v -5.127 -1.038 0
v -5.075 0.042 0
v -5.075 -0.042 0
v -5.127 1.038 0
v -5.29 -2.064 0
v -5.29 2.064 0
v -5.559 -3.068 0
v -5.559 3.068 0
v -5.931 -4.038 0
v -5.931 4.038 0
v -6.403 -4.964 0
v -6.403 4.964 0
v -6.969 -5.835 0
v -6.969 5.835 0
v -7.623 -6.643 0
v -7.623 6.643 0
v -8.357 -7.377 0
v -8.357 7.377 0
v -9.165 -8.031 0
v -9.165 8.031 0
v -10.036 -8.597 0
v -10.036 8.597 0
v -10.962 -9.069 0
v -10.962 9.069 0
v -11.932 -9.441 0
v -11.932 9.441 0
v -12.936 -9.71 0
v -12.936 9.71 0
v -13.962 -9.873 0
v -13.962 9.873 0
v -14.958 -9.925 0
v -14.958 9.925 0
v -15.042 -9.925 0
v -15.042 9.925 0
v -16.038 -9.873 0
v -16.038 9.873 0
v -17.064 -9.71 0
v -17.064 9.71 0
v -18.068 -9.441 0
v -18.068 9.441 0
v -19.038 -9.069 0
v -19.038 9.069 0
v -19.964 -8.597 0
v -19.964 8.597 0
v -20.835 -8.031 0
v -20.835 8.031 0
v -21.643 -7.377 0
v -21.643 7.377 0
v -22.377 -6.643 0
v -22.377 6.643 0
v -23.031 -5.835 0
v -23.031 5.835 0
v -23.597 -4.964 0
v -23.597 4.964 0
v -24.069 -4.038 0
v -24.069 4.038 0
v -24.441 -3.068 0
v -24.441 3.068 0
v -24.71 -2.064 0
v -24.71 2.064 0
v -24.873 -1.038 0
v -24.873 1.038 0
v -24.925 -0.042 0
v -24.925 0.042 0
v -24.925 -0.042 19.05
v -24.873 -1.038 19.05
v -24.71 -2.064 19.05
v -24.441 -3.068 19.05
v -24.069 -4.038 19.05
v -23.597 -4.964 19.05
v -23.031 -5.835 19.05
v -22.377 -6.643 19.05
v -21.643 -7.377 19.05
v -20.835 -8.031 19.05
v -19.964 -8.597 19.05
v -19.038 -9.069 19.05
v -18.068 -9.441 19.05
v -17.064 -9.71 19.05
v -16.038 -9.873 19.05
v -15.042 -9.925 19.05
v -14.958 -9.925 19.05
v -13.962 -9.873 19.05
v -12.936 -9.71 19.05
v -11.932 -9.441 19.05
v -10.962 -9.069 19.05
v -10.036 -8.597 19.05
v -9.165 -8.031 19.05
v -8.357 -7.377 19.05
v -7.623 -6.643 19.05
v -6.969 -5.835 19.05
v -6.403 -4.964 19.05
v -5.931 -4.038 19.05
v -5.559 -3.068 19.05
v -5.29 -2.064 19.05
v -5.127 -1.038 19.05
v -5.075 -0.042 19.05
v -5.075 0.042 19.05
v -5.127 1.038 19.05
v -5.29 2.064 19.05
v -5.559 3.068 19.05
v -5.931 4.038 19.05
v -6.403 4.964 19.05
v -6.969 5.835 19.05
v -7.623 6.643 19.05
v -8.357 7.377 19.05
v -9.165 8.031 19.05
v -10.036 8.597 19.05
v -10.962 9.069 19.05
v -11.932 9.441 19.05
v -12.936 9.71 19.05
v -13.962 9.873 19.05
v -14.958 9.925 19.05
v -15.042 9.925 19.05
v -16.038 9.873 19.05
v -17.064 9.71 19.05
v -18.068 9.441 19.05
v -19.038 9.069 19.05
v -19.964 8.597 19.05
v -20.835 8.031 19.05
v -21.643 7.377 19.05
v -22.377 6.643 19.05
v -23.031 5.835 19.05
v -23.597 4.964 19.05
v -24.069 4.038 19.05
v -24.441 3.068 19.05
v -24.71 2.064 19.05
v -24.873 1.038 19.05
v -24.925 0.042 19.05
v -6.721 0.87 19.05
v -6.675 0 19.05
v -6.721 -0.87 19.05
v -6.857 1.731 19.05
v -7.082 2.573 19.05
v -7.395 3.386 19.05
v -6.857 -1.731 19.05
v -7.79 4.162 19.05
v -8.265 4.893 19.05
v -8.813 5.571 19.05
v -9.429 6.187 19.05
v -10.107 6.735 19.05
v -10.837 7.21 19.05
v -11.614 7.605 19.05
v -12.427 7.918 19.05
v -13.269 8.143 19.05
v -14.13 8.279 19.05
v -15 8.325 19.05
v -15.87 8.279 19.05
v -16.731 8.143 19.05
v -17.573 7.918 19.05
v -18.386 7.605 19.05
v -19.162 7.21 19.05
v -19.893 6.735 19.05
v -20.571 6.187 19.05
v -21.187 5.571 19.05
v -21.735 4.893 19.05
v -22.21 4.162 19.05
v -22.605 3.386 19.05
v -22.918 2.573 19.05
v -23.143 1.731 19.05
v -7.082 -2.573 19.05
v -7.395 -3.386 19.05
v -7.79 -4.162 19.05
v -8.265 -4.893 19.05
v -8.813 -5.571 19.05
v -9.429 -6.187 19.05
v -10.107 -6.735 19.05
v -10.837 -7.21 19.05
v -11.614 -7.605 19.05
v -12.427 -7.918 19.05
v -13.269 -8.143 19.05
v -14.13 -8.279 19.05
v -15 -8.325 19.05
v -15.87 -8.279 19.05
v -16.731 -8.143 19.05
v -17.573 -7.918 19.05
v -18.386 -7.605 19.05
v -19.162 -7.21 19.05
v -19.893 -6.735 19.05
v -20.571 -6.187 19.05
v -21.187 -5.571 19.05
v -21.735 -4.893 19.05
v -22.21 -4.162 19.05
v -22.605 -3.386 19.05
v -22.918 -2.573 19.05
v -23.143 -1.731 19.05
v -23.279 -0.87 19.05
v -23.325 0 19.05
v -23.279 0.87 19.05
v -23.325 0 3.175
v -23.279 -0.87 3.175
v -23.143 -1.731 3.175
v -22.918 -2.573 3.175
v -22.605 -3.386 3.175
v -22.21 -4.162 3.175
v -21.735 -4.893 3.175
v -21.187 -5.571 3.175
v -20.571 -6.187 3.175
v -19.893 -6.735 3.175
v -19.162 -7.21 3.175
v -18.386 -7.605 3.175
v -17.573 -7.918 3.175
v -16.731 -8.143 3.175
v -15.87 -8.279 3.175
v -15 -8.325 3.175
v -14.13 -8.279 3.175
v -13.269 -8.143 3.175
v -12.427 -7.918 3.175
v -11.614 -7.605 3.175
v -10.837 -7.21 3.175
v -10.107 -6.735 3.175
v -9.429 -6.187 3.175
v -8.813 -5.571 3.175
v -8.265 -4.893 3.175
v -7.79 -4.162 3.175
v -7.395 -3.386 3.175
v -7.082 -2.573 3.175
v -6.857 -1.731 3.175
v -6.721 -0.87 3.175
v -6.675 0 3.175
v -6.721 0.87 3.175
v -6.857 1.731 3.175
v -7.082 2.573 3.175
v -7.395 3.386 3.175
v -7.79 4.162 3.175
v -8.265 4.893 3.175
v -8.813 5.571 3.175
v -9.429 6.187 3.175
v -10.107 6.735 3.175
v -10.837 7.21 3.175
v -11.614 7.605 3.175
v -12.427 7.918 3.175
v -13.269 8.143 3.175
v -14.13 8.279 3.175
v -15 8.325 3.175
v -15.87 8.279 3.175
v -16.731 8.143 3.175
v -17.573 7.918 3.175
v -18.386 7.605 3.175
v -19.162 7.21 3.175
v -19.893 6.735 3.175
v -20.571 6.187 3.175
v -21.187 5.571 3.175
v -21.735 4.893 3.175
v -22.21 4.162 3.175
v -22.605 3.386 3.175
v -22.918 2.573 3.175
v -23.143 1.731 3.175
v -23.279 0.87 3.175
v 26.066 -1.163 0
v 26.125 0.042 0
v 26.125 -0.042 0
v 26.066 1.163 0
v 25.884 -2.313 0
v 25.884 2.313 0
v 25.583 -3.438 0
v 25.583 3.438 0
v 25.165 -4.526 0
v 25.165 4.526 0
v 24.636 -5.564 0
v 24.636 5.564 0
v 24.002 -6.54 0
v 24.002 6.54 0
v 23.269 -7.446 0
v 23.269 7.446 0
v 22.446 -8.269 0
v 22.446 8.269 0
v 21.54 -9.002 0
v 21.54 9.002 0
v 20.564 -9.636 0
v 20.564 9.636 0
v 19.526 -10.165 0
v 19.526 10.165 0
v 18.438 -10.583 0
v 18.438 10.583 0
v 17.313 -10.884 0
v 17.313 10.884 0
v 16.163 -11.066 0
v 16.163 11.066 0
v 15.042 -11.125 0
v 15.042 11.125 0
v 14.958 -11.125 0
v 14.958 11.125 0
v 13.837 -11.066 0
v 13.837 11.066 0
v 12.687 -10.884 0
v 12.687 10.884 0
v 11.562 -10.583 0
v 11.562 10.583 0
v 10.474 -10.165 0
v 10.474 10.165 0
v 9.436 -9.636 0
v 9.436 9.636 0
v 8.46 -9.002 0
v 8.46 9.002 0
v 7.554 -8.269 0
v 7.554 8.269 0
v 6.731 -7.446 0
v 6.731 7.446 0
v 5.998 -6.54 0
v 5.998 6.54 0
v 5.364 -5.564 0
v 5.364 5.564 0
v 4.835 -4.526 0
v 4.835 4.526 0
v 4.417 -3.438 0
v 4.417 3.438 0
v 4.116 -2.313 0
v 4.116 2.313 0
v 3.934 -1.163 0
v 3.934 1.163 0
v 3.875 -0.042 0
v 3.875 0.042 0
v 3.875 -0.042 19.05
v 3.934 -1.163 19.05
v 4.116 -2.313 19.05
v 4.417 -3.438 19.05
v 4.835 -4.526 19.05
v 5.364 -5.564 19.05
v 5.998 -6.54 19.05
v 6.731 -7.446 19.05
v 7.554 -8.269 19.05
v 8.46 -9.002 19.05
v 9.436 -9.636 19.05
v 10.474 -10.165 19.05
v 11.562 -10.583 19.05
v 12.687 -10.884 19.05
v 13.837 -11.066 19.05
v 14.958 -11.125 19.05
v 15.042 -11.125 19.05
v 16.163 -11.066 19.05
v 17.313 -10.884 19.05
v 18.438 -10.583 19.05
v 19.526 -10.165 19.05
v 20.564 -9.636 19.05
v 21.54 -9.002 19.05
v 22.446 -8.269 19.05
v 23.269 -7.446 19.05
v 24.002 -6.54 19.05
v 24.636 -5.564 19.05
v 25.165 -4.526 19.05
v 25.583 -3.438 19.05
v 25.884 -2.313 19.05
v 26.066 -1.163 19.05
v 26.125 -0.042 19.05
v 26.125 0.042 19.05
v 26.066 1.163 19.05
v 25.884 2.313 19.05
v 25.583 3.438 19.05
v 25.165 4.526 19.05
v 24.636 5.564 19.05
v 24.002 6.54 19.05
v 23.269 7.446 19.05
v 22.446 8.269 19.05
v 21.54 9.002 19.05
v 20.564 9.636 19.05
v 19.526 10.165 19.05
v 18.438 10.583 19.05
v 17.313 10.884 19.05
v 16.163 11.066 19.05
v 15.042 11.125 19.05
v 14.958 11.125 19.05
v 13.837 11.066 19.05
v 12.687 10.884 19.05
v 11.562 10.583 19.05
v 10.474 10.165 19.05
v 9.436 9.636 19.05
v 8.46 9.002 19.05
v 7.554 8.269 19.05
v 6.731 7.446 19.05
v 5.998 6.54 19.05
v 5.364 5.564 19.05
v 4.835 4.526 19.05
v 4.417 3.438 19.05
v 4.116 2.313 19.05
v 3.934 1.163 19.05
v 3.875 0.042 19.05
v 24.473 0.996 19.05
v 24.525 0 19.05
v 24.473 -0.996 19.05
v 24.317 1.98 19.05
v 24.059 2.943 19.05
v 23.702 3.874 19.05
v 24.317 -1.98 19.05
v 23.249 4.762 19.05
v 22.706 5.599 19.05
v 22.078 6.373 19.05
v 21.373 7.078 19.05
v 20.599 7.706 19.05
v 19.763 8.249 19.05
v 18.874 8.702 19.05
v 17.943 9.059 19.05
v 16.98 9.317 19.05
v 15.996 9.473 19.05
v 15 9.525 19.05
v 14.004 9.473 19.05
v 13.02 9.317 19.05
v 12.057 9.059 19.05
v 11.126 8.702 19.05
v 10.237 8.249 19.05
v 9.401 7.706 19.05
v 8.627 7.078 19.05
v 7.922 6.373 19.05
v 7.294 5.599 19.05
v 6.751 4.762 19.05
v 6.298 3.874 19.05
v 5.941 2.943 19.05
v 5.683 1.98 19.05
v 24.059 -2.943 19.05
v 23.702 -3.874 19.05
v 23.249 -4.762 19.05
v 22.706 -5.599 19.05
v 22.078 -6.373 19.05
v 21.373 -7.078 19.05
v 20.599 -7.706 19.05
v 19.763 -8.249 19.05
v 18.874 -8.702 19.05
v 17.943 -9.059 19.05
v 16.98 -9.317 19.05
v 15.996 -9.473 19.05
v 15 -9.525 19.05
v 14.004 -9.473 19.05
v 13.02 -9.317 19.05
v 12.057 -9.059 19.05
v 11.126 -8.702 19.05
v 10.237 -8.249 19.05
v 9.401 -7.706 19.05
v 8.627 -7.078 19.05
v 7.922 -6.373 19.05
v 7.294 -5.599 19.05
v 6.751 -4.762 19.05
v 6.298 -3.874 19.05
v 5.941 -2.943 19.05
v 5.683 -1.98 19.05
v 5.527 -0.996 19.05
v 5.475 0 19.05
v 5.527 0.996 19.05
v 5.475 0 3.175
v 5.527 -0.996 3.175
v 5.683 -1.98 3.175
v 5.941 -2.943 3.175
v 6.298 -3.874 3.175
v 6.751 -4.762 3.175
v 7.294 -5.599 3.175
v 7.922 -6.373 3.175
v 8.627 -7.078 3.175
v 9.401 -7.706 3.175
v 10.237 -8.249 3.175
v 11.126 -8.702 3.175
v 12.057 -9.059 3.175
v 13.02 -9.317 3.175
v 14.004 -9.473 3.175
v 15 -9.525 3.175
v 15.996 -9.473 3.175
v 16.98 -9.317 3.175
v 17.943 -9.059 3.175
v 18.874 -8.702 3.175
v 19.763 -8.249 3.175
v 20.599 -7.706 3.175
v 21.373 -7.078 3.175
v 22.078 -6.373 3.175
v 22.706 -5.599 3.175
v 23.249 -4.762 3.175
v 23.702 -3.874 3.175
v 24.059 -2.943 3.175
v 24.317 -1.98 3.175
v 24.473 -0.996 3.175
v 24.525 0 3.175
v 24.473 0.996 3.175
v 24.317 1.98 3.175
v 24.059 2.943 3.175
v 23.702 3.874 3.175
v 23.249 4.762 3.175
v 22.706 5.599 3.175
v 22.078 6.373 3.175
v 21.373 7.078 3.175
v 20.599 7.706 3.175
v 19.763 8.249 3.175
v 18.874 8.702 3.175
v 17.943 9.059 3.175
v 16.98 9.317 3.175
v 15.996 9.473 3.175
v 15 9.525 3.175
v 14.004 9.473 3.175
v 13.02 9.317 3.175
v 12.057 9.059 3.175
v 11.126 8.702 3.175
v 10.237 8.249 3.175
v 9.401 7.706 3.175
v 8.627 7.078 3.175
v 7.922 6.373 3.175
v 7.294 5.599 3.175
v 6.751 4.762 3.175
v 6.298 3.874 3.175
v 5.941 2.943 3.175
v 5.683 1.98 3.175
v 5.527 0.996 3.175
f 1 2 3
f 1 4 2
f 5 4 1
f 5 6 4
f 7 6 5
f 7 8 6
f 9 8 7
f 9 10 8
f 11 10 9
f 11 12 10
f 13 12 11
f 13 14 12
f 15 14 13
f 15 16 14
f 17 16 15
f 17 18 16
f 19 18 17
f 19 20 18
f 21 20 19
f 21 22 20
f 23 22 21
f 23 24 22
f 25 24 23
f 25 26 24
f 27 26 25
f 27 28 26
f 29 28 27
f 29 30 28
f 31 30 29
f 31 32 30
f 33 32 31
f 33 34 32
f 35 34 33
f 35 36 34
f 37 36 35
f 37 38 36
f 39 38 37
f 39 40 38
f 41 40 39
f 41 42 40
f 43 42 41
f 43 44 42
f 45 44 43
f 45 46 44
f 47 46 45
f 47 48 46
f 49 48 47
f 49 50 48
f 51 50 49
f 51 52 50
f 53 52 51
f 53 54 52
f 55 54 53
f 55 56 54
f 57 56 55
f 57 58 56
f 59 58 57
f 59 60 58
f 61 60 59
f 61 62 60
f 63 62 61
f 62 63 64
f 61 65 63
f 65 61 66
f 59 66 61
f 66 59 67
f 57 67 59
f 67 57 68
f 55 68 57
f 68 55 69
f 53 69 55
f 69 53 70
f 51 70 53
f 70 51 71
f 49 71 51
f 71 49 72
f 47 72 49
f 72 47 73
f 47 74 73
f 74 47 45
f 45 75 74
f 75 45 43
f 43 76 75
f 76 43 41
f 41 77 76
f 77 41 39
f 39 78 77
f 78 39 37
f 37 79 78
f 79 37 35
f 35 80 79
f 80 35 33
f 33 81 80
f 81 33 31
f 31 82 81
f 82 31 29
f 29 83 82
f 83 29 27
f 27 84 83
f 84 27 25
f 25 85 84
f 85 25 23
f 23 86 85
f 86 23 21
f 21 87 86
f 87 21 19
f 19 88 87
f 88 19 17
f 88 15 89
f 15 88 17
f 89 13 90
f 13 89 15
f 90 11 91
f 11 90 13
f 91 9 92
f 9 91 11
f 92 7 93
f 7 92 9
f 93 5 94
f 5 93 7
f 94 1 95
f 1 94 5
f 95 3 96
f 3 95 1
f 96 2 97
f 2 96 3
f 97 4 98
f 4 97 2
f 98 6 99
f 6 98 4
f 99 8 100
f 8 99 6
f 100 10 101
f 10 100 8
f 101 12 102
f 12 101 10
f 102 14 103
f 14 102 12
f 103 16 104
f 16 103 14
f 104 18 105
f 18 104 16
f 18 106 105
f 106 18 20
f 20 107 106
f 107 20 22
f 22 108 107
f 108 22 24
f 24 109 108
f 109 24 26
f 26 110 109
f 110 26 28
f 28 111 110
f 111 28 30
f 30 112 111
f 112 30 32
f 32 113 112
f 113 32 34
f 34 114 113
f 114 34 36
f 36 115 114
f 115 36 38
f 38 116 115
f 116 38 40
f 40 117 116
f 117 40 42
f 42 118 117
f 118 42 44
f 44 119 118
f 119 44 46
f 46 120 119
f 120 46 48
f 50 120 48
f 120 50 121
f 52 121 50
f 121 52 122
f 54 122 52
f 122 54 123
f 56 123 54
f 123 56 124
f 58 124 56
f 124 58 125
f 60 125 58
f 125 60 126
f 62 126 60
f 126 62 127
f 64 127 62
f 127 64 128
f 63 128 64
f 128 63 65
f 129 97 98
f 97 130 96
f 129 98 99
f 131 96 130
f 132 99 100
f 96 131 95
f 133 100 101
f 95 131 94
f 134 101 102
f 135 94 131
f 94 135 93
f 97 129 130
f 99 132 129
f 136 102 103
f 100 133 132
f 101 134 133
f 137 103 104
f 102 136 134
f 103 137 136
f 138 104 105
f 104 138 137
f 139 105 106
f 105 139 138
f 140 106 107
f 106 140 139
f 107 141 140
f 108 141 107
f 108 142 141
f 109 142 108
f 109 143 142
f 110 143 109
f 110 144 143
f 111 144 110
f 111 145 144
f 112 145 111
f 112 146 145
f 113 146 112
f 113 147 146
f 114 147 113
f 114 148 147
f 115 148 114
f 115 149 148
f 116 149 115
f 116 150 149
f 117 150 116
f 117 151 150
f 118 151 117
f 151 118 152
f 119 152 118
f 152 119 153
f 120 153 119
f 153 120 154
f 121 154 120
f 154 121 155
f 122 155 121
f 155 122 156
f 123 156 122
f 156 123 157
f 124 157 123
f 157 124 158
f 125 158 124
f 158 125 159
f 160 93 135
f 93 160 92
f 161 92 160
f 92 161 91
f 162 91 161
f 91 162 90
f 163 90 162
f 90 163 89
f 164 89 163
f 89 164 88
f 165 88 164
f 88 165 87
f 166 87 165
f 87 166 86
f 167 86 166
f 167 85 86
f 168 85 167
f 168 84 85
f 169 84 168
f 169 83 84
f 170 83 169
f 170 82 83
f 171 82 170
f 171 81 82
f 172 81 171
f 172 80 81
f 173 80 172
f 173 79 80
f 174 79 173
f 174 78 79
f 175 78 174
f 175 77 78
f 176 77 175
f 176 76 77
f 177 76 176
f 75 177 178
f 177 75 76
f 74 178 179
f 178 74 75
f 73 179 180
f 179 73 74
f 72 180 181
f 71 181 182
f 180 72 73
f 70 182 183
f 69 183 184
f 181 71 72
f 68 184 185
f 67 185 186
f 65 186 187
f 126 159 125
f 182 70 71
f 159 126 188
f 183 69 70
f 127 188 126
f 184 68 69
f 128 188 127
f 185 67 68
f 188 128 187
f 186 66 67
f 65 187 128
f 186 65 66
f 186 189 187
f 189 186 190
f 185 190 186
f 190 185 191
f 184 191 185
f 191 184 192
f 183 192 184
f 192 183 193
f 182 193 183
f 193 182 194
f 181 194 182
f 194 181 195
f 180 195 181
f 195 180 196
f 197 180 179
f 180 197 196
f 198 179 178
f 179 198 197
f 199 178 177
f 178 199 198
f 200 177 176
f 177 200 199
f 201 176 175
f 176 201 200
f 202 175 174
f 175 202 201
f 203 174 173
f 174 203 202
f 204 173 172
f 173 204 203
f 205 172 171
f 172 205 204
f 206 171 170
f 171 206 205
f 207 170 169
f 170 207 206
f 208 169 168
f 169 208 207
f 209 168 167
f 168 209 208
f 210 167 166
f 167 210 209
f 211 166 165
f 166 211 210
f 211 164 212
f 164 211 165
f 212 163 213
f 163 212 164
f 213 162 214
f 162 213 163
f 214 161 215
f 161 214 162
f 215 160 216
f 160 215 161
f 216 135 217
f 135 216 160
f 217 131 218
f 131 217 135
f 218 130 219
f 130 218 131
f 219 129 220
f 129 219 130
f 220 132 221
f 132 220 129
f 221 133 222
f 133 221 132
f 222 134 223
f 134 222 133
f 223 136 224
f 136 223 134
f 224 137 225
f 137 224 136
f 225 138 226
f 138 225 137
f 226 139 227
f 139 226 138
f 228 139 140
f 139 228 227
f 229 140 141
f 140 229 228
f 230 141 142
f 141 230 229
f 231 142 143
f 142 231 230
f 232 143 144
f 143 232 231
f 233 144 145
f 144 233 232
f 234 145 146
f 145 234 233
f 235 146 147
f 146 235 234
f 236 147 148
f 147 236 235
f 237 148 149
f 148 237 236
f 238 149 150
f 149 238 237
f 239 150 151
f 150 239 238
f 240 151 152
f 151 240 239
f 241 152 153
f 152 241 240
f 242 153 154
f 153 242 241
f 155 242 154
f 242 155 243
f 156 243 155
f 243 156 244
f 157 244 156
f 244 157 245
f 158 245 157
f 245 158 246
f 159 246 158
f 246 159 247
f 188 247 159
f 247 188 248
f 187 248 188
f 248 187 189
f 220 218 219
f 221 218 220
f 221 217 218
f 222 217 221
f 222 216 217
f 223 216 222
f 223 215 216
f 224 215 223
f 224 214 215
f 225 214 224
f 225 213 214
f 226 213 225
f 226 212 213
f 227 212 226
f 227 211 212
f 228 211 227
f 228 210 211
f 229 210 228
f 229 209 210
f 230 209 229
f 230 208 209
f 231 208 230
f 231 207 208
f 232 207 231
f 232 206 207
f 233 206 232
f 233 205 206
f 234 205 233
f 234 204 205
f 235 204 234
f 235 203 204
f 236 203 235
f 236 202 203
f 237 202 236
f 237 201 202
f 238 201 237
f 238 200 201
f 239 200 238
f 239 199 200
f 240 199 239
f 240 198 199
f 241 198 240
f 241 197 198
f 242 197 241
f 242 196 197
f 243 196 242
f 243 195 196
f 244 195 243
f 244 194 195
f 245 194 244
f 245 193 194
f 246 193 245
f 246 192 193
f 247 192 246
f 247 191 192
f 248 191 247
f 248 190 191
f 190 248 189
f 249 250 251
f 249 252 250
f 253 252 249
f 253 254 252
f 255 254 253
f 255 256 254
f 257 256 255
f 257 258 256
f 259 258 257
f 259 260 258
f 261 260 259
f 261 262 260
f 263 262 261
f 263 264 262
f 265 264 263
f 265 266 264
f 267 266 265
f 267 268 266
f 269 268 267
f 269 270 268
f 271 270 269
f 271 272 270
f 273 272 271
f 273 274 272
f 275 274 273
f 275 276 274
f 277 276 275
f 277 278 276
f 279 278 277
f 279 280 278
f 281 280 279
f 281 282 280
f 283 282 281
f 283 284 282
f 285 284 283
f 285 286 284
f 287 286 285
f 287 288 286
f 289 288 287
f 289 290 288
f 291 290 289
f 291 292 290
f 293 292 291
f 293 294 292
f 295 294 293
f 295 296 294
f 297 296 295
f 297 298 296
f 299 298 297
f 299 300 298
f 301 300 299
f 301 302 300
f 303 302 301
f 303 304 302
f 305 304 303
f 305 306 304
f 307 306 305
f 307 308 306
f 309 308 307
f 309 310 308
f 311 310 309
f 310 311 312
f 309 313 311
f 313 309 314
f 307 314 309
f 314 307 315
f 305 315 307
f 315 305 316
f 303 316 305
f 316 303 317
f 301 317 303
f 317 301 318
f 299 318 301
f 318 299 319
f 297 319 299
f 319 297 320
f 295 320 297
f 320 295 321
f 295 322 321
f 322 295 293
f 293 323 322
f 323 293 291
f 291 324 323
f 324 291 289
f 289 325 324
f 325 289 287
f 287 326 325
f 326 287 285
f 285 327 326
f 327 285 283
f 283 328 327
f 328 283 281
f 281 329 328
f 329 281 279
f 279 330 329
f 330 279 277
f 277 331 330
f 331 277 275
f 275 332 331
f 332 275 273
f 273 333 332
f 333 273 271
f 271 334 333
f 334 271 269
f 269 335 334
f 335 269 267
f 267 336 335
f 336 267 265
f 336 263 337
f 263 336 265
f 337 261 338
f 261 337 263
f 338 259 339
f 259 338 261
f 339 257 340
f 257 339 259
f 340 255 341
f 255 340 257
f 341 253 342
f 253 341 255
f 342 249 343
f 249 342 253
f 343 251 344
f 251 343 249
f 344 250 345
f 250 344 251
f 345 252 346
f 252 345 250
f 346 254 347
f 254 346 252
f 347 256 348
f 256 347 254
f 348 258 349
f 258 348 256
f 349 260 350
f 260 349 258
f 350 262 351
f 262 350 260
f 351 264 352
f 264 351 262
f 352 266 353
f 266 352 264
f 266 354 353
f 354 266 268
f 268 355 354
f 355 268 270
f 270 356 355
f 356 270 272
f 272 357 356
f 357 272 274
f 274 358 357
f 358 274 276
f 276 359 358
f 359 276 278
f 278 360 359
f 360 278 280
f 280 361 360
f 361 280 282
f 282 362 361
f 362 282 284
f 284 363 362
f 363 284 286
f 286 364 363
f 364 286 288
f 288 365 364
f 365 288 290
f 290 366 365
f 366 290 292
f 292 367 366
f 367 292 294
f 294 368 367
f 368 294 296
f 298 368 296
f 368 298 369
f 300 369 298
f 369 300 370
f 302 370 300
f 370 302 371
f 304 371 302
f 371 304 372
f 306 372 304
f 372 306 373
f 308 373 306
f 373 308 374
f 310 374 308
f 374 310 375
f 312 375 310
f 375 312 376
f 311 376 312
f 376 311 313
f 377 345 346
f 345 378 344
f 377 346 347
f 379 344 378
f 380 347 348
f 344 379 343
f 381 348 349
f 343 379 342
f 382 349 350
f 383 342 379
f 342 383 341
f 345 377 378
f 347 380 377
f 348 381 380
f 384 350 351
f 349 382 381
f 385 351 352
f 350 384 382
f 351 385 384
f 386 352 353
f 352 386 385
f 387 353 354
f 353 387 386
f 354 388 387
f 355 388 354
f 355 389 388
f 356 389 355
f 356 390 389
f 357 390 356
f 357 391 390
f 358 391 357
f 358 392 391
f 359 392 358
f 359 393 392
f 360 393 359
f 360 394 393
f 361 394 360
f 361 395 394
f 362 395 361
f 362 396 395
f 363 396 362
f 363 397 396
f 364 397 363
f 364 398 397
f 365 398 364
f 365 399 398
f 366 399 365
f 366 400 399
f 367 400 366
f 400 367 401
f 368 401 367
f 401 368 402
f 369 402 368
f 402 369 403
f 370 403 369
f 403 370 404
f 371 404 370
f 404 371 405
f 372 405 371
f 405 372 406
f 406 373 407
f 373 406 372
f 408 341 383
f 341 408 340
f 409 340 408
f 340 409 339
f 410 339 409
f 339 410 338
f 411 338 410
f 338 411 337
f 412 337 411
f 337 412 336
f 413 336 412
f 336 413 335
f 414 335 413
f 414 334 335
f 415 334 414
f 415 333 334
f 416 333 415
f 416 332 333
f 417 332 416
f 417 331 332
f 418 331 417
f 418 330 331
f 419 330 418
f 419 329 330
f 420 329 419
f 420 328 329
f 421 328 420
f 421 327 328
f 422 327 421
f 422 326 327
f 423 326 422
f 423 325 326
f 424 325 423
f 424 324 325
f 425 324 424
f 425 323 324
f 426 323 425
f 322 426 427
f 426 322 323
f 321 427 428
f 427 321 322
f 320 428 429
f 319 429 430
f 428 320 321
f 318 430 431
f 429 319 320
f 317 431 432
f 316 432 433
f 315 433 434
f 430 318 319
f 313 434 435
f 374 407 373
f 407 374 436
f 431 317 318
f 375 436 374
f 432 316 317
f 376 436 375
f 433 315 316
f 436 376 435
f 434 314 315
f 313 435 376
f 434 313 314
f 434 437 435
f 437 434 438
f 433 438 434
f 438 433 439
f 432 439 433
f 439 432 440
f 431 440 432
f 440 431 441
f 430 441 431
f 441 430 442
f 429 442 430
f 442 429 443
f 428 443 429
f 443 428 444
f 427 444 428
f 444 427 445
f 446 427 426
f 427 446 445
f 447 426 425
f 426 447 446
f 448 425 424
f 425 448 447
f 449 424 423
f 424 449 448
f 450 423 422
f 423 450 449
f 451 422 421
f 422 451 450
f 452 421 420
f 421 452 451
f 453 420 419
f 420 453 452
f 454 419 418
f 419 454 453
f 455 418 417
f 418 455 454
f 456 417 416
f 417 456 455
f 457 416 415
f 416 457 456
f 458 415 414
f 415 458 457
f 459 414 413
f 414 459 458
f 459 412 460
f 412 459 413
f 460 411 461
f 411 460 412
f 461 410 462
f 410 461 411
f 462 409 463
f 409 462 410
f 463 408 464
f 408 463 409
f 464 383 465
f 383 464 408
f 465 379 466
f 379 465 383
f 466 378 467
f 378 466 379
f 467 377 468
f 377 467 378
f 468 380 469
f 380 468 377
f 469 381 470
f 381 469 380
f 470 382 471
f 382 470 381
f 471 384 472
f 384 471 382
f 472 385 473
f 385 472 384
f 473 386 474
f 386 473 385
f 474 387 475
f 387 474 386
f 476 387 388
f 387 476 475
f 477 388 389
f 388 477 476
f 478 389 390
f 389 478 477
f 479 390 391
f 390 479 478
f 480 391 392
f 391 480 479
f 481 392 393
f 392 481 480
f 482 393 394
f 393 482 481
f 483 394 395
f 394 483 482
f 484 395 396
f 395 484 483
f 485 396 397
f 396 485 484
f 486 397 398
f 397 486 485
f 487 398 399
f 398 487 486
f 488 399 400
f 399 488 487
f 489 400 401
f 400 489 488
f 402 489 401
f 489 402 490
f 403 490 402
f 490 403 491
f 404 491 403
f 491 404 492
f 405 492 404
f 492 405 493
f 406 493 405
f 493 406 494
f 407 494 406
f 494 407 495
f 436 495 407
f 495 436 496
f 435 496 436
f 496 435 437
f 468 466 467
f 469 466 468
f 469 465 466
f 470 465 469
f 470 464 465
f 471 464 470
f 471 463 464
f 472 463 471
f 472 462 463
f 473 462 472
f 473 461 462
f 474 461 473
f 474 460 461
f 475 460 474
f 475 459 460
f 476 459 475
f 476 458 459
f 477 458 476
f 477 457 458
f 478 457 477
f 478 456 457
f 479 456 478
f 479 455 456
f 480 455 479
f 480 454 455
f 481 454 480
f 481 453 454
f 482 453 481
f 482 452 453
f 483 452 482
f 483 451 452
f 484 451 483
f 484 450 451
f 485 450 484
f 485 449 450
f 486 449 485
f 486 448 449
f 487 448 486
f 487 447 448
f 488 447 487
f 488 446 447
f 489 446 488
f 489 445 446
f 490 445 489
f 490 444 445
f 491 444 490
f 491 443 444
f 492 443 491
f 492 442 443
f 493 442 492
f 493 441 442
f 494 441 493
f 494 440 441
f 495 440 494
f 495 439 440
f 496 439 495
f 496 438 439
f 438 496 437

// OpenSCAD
// file: ../lib/TOGMod1Constructors.scad
// TOGMod1Constructors-v1.11
// 
// Functions to construct objects understood by TOGMod1
// 
// v1.1:
// - Add togmod1_make_rounded_rect
// v1.2:
// - togmod1_make_rounded_rect can make ovals
// v1.3:
// - togmod1_circle_points, to just get the points of a circle
// - if pos parameter to circle function has a third element,
//   returned vertexes will include it as the z component;
// v1.3.1
// - Some assertions
// v1.4:
// - Refactor togmod1_rounded_rect_points and togmod1_circle_points
//   to use togmod1__make_nd_vector_adder for adapting to whatever
//   `pos` parameter is.
// v1.5:
// - togmod_rounded_rect_points will not simplify completely rounded sides
//   (where length of side is exactly twice the rounding radius)
//   unless simplify_rounded_sides=true
//   - This makes it more useful for polyhedron generation,
//     where radius varies, but number of points must remain constant.
// v1.6:
// - togmod1_make_rect makes a simple rectangle
// - togmod1_make_rounded_rect will defer to togmod1_make_rect when r=0
// v1.7:
// - togmod1_make_circle will return empty shape (["union"]) when d=0
// v1.8:
// - Add togmod1_text
// v1.9:
// - togmod1_circle_points uses 3 as minimum circle point count instead of 6
// v1.10:
// - Fix togmod1_linear_extrude_y so that range corresponds to Y start/end and
//   polygon X,Y correspond to X,Z.  Previously it was rotated wrongly,
//   which would have gone unnoticed for symmetrical shapes centered at 0,0.
// v1.11:
// - Remove an 'echo'

use <./TOGArrayLib1.scad>

function togmod1__make_nd_vector_adder(origin=[0,0]) =
	let(origin_is_zero = tal1_reduce(true, origin, function(prev,item) prev && item == 0))
	origin_is_zero ? (function(vec) len(vec) >= len(origin) ? vec : tal1_replace_at(origin, 0, vec)) :
	function(vec) [
		for(i=[0:1:max(len(origin),len(vec))-1]) (len(vec) > i ? vec[i] : 0) + (len(origin) > i ? origin[i] : 0),
	];

assert([1,2,3] == togmod1__make_nd_vector_adder()([1,2,3]));
assert([1,2,3] == togmod1__make_nd_vector_adder([0,0,3])([1,2]));


function togmod1_make_cuboid(size) =
	assert(is_list(size))
	assert(len(size) >= 3)
	assert(is_num(size[0]))
	assert(is_num(size[1]))
	assert(is_num(size[2]))
	["polyhedron-vf", [
		[-size[0]/2, -size[1]/2, -size[2]/2],
		[+size[0]/2, -size[1]/2, -size[2]/2],
		[-size[0]/2, +size[1]/2, -size[2]/2],
		[+size[0]/2, +size[1]/2, -size[2]/2],
		[-size[0]/2, -size[1]/2, +size[2]/2],
		[+size[0]/2, -size[1]/2, +size[2]/2],
		[-size[0]/2, +size[1]/2, +size[2]/2],
		[+size[0]/2, +size[1]/2, +size[2]/2]
	], [
		[0,1,3,2],[0,4,5,1],[4,6,7,5],[3,7,6,2],[1,5,7,3],[6,4,0,2]
	]];

function togmod1_make_polygon(verts) =
	["polygon-vp", verts, [[for( i=[0:1:len(verts)-1] ) i%len(verts)]]];

function togmod1_rounded_rect_points(size, r, pos=[0,0], simplify_rounded_sides=false) =
	assert(is_list(size))
	assert(len(size) >= 2)
	let(radii = is_list(r) ? r : is_num(r) ? [r,r] : assert(false, "rounded_rect r(adius) should be list<num> or num"))
	let(rx = radii[0])
	let(ry = radii[1])
	assert(is_num(rx))
	assert(is_num(ry))
	assert(size[0] >= 2*rx, str("size[0] must be >= 2*r[0]; size[0] = ",size[0],", 2*r[0] = ",2*rx))
	assert(size[1] >= 2*ry, str("size[1] must be >= 2*r[1]; size[1] = ",size[1],", 2*r[1] = ",2*ry))
	let(quarterfn=max($fn/4, 1))
	let(qfnx = simplify_rounded_sides && size[0] == 2*rx ? quarterfn-1 : quarterfn)
	let(qfny = simplify_rounded_sides && size[1] == 2*ry ? quarterfn-1 : quarterfn)
	let(finalizepos = togmod1__make_nd_vector_adder(pos))
[
	for(a=[0 : 1 : qfnx]) let(ang=      a*90/quarterfn) finalizepos([ size[0]/2-rx + rx*cos(ang),  size[1]/2-ry + ry*sin(ang)]),
	for(a=[0 : 1 : qfny]) let(ang= 90 + a*90/quarterfn) finalizepos([-size[0]/2+rx + rx*cos(ang),  size[1]/2-ry + ry*sin(ang)]),
	for(a=[0 : 1 : qfnx]) let(ang=180 + a*90/quarterfn) finalizepos([-size[0]/2+rx + rx*cos(ang), -size[1]/2+ry + ry*sin(ang)]),
	for(a=[0 : 1 : qfny]) let(ang=270 + a*90/quarterfn) finalizepos([ size[0]/2-rx + rx*cos(ang), -size[1]/2+ry + ry*sin(ang)]),
];

function togmod1_make_rect(size) =
	togmod1_make_polygon([
		[-size[0]/2, -size[1]/2],
		[+size[0]/2, -size[1]/2],
		[+size[0]/2, +size[1]/2],
		[-size[0]/2, +size[1]/2],
	]);

function togmod1_make_rounded_rect(size, r) =
	r == 0 ? togmod1_make_rect(size) :
	togmod1_make_polygon(togmod1_rounded_rect_points(size,r,simplify_rounded_sides=true));

/**
 * Returns points for an approximation of a circle where points are at distance r from pos.
 * Can be used to make other regular polygons, but the faces will be less than that
 * distance from pos (do some trig if you want face distance, e.g. for a hex nut).
 */
function togmod1_circle_points(r, pos=[0,0], d=undef) =
	assert( !is_undef(r) || !is_undef(d) )
	assert(!is_undef(pos[0]))
	assert(!is_undef(pos[1]))
	let(finalizepos = togmod1__make_nd_vector_adder(pos))
	let(r_ = !is_undef(r) ? r : d/2)
	let(fn = max($fn, 3))
	[for(i=[0 : 1 : fn-1]) finalizepos([r_*cos(i*360/fn), r_*sin(i*360/fn)])];

function togmod1_make_circle(r, pos=[0,0], d=undef) =
	r == 0 || d == 0 ? ["union"] :
	togmod1_make_polygon(togmod1_circle_points(r=r, pos=pos, d=d));

function togmod1_make_cylinder(d, zrange=[0,1], r=undef, pos=[0,0]) =
	assert( !is_undef(r) || !is_undef(d) )
	let( r_ = !is_undef(r) ? r : d/2 )
	// TODO: Make polyhedron directly
	["linear-extrude-zs", zrange, togmod1_make_circle(r=r_, pos=pos)];

function togmod1__is_range1d(range) = is_list(range) && len(range) == 2 && is_num(range[0]) && is_num(range[1]);

function togmod1_linear_extrude_z(range, shape) =
	assert(togmod1__is_range1d(range))
	["linear-extrude-zs", range, shape];
function togmod1_linear_extrude_x(range, shape) =
	assert(togmod1__is_range1d(range))
	["rotate", [90, 0, 90], togmod1_linear_extrude_z(range, shape)];
function togmod1_linear_extrude_y(range, shape) =
	assert(togmod1__is_range1d(range))
	["rotate", [90, 0,  0], togmod1_linear_extrude_z([-range[1], -range[0]], shape)];

function togmod1_text(text, size, font, halign, valign, spacing, direction, language, script) =
	["text-tsfhvsdls", text, size, font, halign, valign, spacing, direction, language, script];
// file: ../lib/TOGArrayLib1.scad
// TOGArrayLib1.5
// 
// Functions for working with arrays.
// 
// v1.1:
// - tal1_reduce assert(is_list(items)) to prevent infinite recursion
//   when given undefined or other non-list values
// v1.1.1:
// - Fix tal1_uniq_remap_v2 to return "list-remap-result" as the
//   first element of the returned list
// v1.2:
// - Add tal1_replace_at function
// v1.3:
// - tal1_is_vec_of, tal1_is_vec_of_num
// v1.4:
// - tal1_assert_for_each, for when you want to assert something
//   about each of a list of items and get nice failure messages
// v1.5:
// - Add tal1_duplicate_reversed function, which may be
//   handy when generating symmetrical polygons and stuff.

/**
 * Make a list with the contents of list `a`,
 * but starting at offset `off`, replaced by the contents of list `b`.
 * len(result) = max(len(a), off+len(b))
 */
function tal1_replace_at(a, off, b, default_value=undef, default_value_function=undef) =
	assert(is_list(a))
	assert(is_list(b))
	let( _dvf = !is_undef(default_value_function) ? default_value_function : function(i) default_value )
[
	for( i=[0:1:min(off,len(a))-1] ) a[i],
	for( i=[len(a):1:off-1] ) _dvf(i),
	for( i=[off:1:off+len(b)-1] ) b[i-off],
	for( i=[off+len(b):1:len(a)-1] ) a[i],
];

// Simplest case
assert([] == tal1_replace_at([], 0, []));
// Second simplest cases
assert(["foo"] == tal1_replace_at(["foo"], 0, []));
assert(["foo"] == tal1_replace_at([], 0, ["foo"]));
// Replace one item
assert(["foo","quux","baz"] == tal1_replace_at(["foo","bar","baz"], 1, ["quux"]));
// Replace and extend
assert(["foo","quux","tuna","tina"] == tal1_replace_at(["foo","bar","baz"], 1, ["quux", "tuna", "tina"]));
// Add beyond end of `a`
assert(["foo","zzz","quux"] == tal1_replace_at(["foo"], 2, ["quux"], default_value="zzz"));
// Adding 'nothing' should still fill to that point with defaults
assert(["foo","zzz","zzz"] == tal1_replace_at(["foo"], 3, [], default_value="zzz"));


function tal1_reduce(start, items, func, offset=0) =
	assert(is_list(items))
	len(items) == offset ? start :
	tal1_reduce(func(start, items[offset]), items, func, offset+1);

function tal1_consecutive_duplicate_count(items) = tal1_reduce(
	[0, undef],
	items,
	function(z,item) [z[0] + (item == z[1] ? 1 : 0), item]
)[0];

assert(0 == tal1_consecutive_duplicate_count([]));
assert(0 == tal1_consecutive_duplicate_count([50]));
assert(1 == tal1_consecutive_duplicate_count([50,50]));
assert(0 == tal1_consecutive_duplicate_count([50,51,52,53]));
assert(1 == tal1_consecutive_duplicate_count([50,51,52,52]));
assert(3 == tal1_consecutive_duplicate_count([50,50,50,50]));

// Set test_size to arbirarily large values
// to ensure that OpenSCAD can handle heavy recursion
let(test_size=1000) assert(test_size/2 == tal1_consecutive_duplicate_count([for(i=[0:1:test_size-1]) floor(i/2)]));



function tal1_uniq_(items, off0, off1) =
	let(chunklen = off1-off0)
	chunklen == 0 ? [] :
	chunklen == 1 ? [items[off0]] :
	let(half=floor(chunklen/2))
	let(left  = tal1_uniq_(items, off0     , off0+half))
	let(right = tal1_uniq_(items, off0+half, off1     ))
	assert(len(left) > 0)
	assert(len(right) > 0)
	left[len(left)-1] == right[0] ? [each left, for(i=[1:1:len(right)-1]) right[i]] :
	[each left, each right];

/** Given a list of items, returns a new list with identical consecutive items merged */
function tal1_uniq(items) = tal1_uniq_(items, 0, len(items));

assert([] == tal1_uniq([]));
assert([123] == tal1_uniq([123]));
assert([55,0,1,2,3] == tal1_uniq([55,0,1,2,3]));
assert([55,0,1,2] == tal1_uniq([55,0,1,1,2]));
assert([55,0,1] == tal1_uniq([55,55,0,0,0,0,0,0,1,1,1,1]));
assert([55,0] == tal1_uniq([55,0,0,0,0,0,0,0]));



/**
 * Returns [new items, old index -> new index mapping].
 * No-op version.
 */
function tal1_uniq_remap_v1(items) =
	["list-remap-result", items, [for (vi=[0:1:len(items)-1]) vi]];

// [a, a, b, b, c, c]
//
// [a,    ...], []  -> [a],[0]
// [a, a, ...], [0] -> [a],[0,0]

assert([1,2,3] == [1,2,3]);

/**
 * Recursive version that will combine adjacent identical vertexes,
 * but will use the original items.
 */
function tal1_uniq_remap_v2(items, map=[]) =
	let(index = len(map))
	len(items) == index ? ["list-remap-result", items, map] :
	index == 0 ? tal1_uniq_remap_v2(items, [0]) :
	items[index] == items[map[index-1]] ? tal1_uniq_remap_v2(items, [for(vi=map) vi, map[index-1]]) :
	tal1_uniq_remap_v2(items, [for(vi=map) vi, index]);

assert(tal1_uniq_remap_v2([1,1,2,2,3,4]) == ["list-remap-result", [1,1,2,2,3,4], [0,0,2,2,4,5]]);


/**
 * Returns true if `vec` is a list of at least min_len items
 * and component_check(each item, even those beyond min_len) is true.
 */
function tal1_is_vec_of(vec, min_len=0, component_check=function(x) true) =
	assert(is_num(min_len) && min_len >= 0)
	assert(is_function(component_check))
	is_list(vec) && len(vec) >= min_len &&
	tal1_reduce(true, vec, function(prev,item) prev && component_check(item));

function tal1_is_vec_of_num(vec, min_len=0) = tal1_is_vec_of(vec, min_len, function(i) is_num(i));

assert( true == tal1_is_vec_of_num([1,2,3]));
assert( true == tal1_is_vec_of_num([]));
assert( true == tal1_is_vec_of_num([1,2,3], 3));
assert(false == tal1_is_vec_of_num([1,2], 3));
assert(false == tal1_is_vec_of_num([1,2,"spoon"], 3));
// Requirements are ambiguous when
// first min_len items are numbers, but there are non-numeric items afterwards,
// so let's error on the side of saying 'no, it's not a list of numbers';
// i.e. the item check and the min_len are independent.
assert(false == tal1_is_vec_of_num([1,2,3,"artichoke"], 3));


/**
 * Asserts that item_checker(each item in list, index of item)[0] is true.
 * Second element of item_checker return value is assertion message.
 * Returns the original list, in case that's useful to you.
 */
function tal1_assert_for_each(list, item_checker) =
	let( _ignored = [ for(i=[0:1:len(list)-1])
		let(q=item_checker(list[i],i))
		let(passed=is_bool(q) ? q : is_list(q) ? q[0] : assert(false, str(
			"tal1_assert_for_each: item_checker should return Bool|[Bool,String], but returned ",
			q, " for item at index ", i)))
		let(message=is_list(q) ? q[1] : undef)
		assert(passed, message)
		q
	])
	list;

// Callback can return a boolean...
assert([1,2,3] == tal1_assert_for_each([1,2,3], function(v,i) is_num(v)));
// ...or a [boolean, string]
assert([1,2,3] == tal1_assert_for_each([1,2,3], function(v,i) [is_num(v), "element be a num"]));

// [a, b, c] -> [a, b, c, rxf(c), rxf(b), rxf(a)]
function tal1_duplicate_reversed(list, rxf=function(item) item) =
	[
		each list,
		for( i=[len(list)-1 : -1 : 0] ) rxf(list[i]),
	];
// file: ../lib/TOGComplexLib1.scad
function tcplx1_multiply(a, b) =
	[a[0]*b[0] - a[1]*b[1], a[0]*b[1] + a[1]*b[0]];
function tcplx1_divide(a, b) =
	let(bot = (b[0]*b[0] + b[1]*b[1]))
	[
		(a[0]*b[0] + a[1]*b[1])/bot,
		(a[1]*b[0] - a[0]*b[1])/bot
	];

assert([-11,23] == tcplx1_multiply([3,2], [1,7]));

assert([-1,3] == tcplx1_multiply([3,1], [0,1]));
assert([-1,3] == tcplx1_multiply([0,1], [3,1]));

echo(tcplx1_divide([-1,3], [3,1]));
assert([0,1] == tcplx1_divide([-1,3], [3,1]));

function tcplx1_normalize(vec) =
	let(veclen = sqrt(vec[0]*vec[0]+vec[1]*vec[1]))
	[vec[0] / veclen, vec[1] / veclen];

function tcplx1_relative_turnvec_vv(v0, v1) =
	tcplx1_divide(tcplx1_normalize(v1), tcplx1_normalize(v0));

function tcplx1_relative_turnvec_abc(p0, p1, p2) = tcplx1_relative_turnvec_vv(p1-p0, p2-p1);

// A 90-degree turn
assert([0,1] == tcplx1_relative_turnvec_abc([0,0], [1,0], [1,1]));
assert([0,1] == tcplx1_relative_turnvec_abc([0,0], [0,1], [-1,1]));

// A 45-degree turn
assert(tcplx1_normalize([1,1]) == tcplx1_relative_turnvec_abc([0,0], [1,0], [ 2,1]));
assert(tcplx1_normalize([1,1]) == tcplx1_relative_turnvec_abc([0,0], [0,1], [-1,2]));


function tcplx1_relative_angle_abc(p0, p1, p2) =
	let(turnvec = tcplx1_relative_turnvec_abc(p0, p1, p2))
	atan2(turnvec[1], turnvec[0]);

assert(-135 == tcplx1_relative_angle_abc([0,0], [1,0], [0,-1]));
assert( -90 == tcplx1_relative_angle_abc([0,0], [1,0], [1,-1]));
assert(   0 == tcplx1_relative_angle_abc([0,0], [1,0], [2, 0]));
assert(  90 == tcplx1_relative_angle_abc([0,0], [1,0], [1, 1]));
assert( 135 == tcplx1_relative_angle_abc([0,0], [1,0], [0, 1]));

assert(  90 == tcplx1_relative_angle_abc([1,1], [3,3], [1, 5]));
// file: ../lib/TOGVecLib0.scad
// Note: TOGMod1Constructors's togmod1__make_nd_vector_adder is used for similar purpose.

function togvec0_extend(vec, length, filler=0) = [
	for( i=[0 : 1 : length-1] ) len(vec) <= i ? filler : vec[i]
];

function togvec0_add_vec(a, b) =
	let( newlen = max(len(a), len(b)) )
	togvec0_extend(a, newlen) + togvec0_extend(b, newlen);

function togvec0_offset_points(points, offset, numtovec=function(n) [0,0,n] ) =
	let( offset_vec =
		is_list(offset) ? offset :
		is_num(offset) ? numtovec(offset) :
		assert(false, str("togvec0_offset_points: `offset` must be a List<Number> or Number; got: ", offset)) )
	[for(p=points) togvec0_add_vec(p, offset_vec)];
// file: ../lib/TOGMod1.scad
// TOGMod1.9
// OpenSCAD library for representing shapes
// 
// See also: Functional OpenSCAD (https://github.com/thehans/FunctionalOpenSCAD)
// 
// v1.8:
// - Add `text-tsfhvsdls`
// v1.9
// - Add `offset-ds` (offset with _d_elta a _s_hape)

module togmod1_domodule(mod) {
	assert(is_list(mod));
	assert(len(mod) > 0);
	if( mod[0] == "polygon-vp" ) {
		// ["polygon-vp", vertexes, paths]
		polygon(points=mod[1], paths=mod[2]);
	} else if( mod[0] == "polyhedron-vf" ) {
		polyhedron(mod[1], faces=mod[2]);
	} else if( mod[0] == "scale" ) {
		assert(len(mod) == 3);
		scale(mod[1]) togmod1_domodule(mod[2]);
	} else if( mod[0] == "translate" ) {
		assert(len(mod) == 3);
		assert(is_list(mod[1]));
		for(c=mod[1]) assert(is_num(c), "translate component should be numeric");
		translate(mod[1]) togmod1_domodule(mod[2]);
	} else if( mod[0] == "rotate" ) {
		assert(len(mod) == 3);
		rotate(mod[1]) togmod1_domodule(mod[2]);
	} else if( mod[0] == "intersection" ) {
		intersection_for( i=[1:1:len(mod)-1] ) togmod1_domodule(mod[i]);
	} else if( mod[0] == "difference" ) {
		difference() {
			togmod1_domodule(mod[1]);
			for( i=[2:1:len(mod)-1] ) togmod1_domodule(mod[i]);
		}
	} else if( mod[0] == "union" ) {
		for( i=[1:1:len(mod)-1] ) togmod1_domodule(mod[i]);
	} else if( mod[0] == "hull" ) {
		hull() for( i=[1:1:len(mod)-1] ) togmod1_domodule(mod[i]);
	} else if( mod[0] == "offset-rs" ) {
		assert(len(mod) == 3);
		assert(is_num(mod[1]));
		assert(is_list(mod[2]));
		offset(mod[1]) togmod1_domodule(mod[2]);
	} else if( mod[0] == "linear-extrude-zs" ) {
		// ["linear-extrude-zs", [z0,z1], 2d_shape] // centered
		// ["linear-extrude-zs", height, 2d_shape]
		let( zrange = is_list(mod[1]) ? mod[1] : [-mod[1]/2, mod[1]/2] ) {
			translate([0,0,zrange[0]]) linear_extrude(zrange[1]-zrange[0]) togmod1_domodule(mod[2]);
		}
	} else if( mod[0] == "render" ) {
		render() togmod1_domodule(mod[1]);
	} else if( mod[0] == "minkowski" ) {
		minkowski() {
			togmod1_domodule(mod[1]);
			togmod1_domodule(mod[2]);
		}
	} else if( mod[0] == "x-debug" ) {
		# togmod1_domodule(mod[1]);
	} else if( mod[0] == "x-color" ) {
		color(mod[1]) togmod1_domodule(mod[2]);
	} else if( mod[0] == "text-tsfhvsdls" ) {
		text(text=mod[1], size=mod[2], font=mod[3], halign=mod[4], valign=mod[5], spacing=mod[6], direction=mod[7], language=mod[7], script=mod[8]);
	} else if( mod[0] == "offset-ds" ) {
		assert(is_num(mod[1]));
		assert(is_list(mod[2]));
		offset(delta=mod[1]) togmod1_domodule(mod[2]);
	} else {
		assert(false, str("Unrecognized shape: ", mod[0]));
	}
}
// file: ../lib/SimpleCap0.scad
// SimpleCap0.1
// 
// Library for making very simple caps for things
// whose outline can be described by a rath.

use <../lib/TOGPath1.scad>
use <../lib/TOGPolyhedronLib1.scad>
use <../lib/TOGVecLib0.scad>

function simplecap0_decode_rath(shape) =
	assert(is_list(shape) && len(shape) >= 1, str("Shape must be a list of length at least 1, got: ", shape))
	shape[0] == "togpath1-rath" ? shape :
	shape[0] == "circle-d" ? togpath1_make_circle_rath(r=shape[1]/2) :
	shape[0] == "circle-r" ? togpath1_make_circle_rath(r=shape[1]) :
	shape[0] == "oval-wh" ? let(size=shape[1]) togpath1_make_rectangle_rath([size[0],size[1]], [["round", min(size[0],size[1])/2]]) :
	assert(false, str("Unrecognized shape description: ", shape));

function simplecap0_make_cap(inner_shape, total_height=19.05, floor_thickness=3.175, wall_thickness=1.6) =
	let( rath = simplecap0_decode_rath(inner_shape) )
	let( t0 = 0, t1 = wall_thickness )
	let( y0 = 0, yt = total_height, yf = floor_thickness )
	tphl1_make_polyhedron_from_layer_function([
		[y0, t1],
		[yt, t1],
		[yt, t0],
		[yf, t0],
	], function(zo) let(z = zo[0], wall_offset=zo[1])
		togvec0_offset_points(togpath1_rath_to_polypoints(togpath1_offset_rath(rath, wall_offset)), z));
// main file
// TrikeBarEndCaps0.1
// 
// End caps for the rusty metal bar
// I tied to the tricycle handle

module __cigaretteholder1cap__end_params() { }

use <../lib/SimpleCap0.scad>
use <../lib/TOGMod1.scad>

inch = 25.4;
$fn = 64;

togmod1_domodule(["union",
	["translate", [-15,0,0], simplecap0_make_cap(["circle-d", 16.65, 3/4*inch, 3.175, 3.175])],
	["translate", [ 15,0,0], simplecap0_make_cap(["circle-d", 19.05, 3/4*inch, 3.175, 3.175])],
]);
